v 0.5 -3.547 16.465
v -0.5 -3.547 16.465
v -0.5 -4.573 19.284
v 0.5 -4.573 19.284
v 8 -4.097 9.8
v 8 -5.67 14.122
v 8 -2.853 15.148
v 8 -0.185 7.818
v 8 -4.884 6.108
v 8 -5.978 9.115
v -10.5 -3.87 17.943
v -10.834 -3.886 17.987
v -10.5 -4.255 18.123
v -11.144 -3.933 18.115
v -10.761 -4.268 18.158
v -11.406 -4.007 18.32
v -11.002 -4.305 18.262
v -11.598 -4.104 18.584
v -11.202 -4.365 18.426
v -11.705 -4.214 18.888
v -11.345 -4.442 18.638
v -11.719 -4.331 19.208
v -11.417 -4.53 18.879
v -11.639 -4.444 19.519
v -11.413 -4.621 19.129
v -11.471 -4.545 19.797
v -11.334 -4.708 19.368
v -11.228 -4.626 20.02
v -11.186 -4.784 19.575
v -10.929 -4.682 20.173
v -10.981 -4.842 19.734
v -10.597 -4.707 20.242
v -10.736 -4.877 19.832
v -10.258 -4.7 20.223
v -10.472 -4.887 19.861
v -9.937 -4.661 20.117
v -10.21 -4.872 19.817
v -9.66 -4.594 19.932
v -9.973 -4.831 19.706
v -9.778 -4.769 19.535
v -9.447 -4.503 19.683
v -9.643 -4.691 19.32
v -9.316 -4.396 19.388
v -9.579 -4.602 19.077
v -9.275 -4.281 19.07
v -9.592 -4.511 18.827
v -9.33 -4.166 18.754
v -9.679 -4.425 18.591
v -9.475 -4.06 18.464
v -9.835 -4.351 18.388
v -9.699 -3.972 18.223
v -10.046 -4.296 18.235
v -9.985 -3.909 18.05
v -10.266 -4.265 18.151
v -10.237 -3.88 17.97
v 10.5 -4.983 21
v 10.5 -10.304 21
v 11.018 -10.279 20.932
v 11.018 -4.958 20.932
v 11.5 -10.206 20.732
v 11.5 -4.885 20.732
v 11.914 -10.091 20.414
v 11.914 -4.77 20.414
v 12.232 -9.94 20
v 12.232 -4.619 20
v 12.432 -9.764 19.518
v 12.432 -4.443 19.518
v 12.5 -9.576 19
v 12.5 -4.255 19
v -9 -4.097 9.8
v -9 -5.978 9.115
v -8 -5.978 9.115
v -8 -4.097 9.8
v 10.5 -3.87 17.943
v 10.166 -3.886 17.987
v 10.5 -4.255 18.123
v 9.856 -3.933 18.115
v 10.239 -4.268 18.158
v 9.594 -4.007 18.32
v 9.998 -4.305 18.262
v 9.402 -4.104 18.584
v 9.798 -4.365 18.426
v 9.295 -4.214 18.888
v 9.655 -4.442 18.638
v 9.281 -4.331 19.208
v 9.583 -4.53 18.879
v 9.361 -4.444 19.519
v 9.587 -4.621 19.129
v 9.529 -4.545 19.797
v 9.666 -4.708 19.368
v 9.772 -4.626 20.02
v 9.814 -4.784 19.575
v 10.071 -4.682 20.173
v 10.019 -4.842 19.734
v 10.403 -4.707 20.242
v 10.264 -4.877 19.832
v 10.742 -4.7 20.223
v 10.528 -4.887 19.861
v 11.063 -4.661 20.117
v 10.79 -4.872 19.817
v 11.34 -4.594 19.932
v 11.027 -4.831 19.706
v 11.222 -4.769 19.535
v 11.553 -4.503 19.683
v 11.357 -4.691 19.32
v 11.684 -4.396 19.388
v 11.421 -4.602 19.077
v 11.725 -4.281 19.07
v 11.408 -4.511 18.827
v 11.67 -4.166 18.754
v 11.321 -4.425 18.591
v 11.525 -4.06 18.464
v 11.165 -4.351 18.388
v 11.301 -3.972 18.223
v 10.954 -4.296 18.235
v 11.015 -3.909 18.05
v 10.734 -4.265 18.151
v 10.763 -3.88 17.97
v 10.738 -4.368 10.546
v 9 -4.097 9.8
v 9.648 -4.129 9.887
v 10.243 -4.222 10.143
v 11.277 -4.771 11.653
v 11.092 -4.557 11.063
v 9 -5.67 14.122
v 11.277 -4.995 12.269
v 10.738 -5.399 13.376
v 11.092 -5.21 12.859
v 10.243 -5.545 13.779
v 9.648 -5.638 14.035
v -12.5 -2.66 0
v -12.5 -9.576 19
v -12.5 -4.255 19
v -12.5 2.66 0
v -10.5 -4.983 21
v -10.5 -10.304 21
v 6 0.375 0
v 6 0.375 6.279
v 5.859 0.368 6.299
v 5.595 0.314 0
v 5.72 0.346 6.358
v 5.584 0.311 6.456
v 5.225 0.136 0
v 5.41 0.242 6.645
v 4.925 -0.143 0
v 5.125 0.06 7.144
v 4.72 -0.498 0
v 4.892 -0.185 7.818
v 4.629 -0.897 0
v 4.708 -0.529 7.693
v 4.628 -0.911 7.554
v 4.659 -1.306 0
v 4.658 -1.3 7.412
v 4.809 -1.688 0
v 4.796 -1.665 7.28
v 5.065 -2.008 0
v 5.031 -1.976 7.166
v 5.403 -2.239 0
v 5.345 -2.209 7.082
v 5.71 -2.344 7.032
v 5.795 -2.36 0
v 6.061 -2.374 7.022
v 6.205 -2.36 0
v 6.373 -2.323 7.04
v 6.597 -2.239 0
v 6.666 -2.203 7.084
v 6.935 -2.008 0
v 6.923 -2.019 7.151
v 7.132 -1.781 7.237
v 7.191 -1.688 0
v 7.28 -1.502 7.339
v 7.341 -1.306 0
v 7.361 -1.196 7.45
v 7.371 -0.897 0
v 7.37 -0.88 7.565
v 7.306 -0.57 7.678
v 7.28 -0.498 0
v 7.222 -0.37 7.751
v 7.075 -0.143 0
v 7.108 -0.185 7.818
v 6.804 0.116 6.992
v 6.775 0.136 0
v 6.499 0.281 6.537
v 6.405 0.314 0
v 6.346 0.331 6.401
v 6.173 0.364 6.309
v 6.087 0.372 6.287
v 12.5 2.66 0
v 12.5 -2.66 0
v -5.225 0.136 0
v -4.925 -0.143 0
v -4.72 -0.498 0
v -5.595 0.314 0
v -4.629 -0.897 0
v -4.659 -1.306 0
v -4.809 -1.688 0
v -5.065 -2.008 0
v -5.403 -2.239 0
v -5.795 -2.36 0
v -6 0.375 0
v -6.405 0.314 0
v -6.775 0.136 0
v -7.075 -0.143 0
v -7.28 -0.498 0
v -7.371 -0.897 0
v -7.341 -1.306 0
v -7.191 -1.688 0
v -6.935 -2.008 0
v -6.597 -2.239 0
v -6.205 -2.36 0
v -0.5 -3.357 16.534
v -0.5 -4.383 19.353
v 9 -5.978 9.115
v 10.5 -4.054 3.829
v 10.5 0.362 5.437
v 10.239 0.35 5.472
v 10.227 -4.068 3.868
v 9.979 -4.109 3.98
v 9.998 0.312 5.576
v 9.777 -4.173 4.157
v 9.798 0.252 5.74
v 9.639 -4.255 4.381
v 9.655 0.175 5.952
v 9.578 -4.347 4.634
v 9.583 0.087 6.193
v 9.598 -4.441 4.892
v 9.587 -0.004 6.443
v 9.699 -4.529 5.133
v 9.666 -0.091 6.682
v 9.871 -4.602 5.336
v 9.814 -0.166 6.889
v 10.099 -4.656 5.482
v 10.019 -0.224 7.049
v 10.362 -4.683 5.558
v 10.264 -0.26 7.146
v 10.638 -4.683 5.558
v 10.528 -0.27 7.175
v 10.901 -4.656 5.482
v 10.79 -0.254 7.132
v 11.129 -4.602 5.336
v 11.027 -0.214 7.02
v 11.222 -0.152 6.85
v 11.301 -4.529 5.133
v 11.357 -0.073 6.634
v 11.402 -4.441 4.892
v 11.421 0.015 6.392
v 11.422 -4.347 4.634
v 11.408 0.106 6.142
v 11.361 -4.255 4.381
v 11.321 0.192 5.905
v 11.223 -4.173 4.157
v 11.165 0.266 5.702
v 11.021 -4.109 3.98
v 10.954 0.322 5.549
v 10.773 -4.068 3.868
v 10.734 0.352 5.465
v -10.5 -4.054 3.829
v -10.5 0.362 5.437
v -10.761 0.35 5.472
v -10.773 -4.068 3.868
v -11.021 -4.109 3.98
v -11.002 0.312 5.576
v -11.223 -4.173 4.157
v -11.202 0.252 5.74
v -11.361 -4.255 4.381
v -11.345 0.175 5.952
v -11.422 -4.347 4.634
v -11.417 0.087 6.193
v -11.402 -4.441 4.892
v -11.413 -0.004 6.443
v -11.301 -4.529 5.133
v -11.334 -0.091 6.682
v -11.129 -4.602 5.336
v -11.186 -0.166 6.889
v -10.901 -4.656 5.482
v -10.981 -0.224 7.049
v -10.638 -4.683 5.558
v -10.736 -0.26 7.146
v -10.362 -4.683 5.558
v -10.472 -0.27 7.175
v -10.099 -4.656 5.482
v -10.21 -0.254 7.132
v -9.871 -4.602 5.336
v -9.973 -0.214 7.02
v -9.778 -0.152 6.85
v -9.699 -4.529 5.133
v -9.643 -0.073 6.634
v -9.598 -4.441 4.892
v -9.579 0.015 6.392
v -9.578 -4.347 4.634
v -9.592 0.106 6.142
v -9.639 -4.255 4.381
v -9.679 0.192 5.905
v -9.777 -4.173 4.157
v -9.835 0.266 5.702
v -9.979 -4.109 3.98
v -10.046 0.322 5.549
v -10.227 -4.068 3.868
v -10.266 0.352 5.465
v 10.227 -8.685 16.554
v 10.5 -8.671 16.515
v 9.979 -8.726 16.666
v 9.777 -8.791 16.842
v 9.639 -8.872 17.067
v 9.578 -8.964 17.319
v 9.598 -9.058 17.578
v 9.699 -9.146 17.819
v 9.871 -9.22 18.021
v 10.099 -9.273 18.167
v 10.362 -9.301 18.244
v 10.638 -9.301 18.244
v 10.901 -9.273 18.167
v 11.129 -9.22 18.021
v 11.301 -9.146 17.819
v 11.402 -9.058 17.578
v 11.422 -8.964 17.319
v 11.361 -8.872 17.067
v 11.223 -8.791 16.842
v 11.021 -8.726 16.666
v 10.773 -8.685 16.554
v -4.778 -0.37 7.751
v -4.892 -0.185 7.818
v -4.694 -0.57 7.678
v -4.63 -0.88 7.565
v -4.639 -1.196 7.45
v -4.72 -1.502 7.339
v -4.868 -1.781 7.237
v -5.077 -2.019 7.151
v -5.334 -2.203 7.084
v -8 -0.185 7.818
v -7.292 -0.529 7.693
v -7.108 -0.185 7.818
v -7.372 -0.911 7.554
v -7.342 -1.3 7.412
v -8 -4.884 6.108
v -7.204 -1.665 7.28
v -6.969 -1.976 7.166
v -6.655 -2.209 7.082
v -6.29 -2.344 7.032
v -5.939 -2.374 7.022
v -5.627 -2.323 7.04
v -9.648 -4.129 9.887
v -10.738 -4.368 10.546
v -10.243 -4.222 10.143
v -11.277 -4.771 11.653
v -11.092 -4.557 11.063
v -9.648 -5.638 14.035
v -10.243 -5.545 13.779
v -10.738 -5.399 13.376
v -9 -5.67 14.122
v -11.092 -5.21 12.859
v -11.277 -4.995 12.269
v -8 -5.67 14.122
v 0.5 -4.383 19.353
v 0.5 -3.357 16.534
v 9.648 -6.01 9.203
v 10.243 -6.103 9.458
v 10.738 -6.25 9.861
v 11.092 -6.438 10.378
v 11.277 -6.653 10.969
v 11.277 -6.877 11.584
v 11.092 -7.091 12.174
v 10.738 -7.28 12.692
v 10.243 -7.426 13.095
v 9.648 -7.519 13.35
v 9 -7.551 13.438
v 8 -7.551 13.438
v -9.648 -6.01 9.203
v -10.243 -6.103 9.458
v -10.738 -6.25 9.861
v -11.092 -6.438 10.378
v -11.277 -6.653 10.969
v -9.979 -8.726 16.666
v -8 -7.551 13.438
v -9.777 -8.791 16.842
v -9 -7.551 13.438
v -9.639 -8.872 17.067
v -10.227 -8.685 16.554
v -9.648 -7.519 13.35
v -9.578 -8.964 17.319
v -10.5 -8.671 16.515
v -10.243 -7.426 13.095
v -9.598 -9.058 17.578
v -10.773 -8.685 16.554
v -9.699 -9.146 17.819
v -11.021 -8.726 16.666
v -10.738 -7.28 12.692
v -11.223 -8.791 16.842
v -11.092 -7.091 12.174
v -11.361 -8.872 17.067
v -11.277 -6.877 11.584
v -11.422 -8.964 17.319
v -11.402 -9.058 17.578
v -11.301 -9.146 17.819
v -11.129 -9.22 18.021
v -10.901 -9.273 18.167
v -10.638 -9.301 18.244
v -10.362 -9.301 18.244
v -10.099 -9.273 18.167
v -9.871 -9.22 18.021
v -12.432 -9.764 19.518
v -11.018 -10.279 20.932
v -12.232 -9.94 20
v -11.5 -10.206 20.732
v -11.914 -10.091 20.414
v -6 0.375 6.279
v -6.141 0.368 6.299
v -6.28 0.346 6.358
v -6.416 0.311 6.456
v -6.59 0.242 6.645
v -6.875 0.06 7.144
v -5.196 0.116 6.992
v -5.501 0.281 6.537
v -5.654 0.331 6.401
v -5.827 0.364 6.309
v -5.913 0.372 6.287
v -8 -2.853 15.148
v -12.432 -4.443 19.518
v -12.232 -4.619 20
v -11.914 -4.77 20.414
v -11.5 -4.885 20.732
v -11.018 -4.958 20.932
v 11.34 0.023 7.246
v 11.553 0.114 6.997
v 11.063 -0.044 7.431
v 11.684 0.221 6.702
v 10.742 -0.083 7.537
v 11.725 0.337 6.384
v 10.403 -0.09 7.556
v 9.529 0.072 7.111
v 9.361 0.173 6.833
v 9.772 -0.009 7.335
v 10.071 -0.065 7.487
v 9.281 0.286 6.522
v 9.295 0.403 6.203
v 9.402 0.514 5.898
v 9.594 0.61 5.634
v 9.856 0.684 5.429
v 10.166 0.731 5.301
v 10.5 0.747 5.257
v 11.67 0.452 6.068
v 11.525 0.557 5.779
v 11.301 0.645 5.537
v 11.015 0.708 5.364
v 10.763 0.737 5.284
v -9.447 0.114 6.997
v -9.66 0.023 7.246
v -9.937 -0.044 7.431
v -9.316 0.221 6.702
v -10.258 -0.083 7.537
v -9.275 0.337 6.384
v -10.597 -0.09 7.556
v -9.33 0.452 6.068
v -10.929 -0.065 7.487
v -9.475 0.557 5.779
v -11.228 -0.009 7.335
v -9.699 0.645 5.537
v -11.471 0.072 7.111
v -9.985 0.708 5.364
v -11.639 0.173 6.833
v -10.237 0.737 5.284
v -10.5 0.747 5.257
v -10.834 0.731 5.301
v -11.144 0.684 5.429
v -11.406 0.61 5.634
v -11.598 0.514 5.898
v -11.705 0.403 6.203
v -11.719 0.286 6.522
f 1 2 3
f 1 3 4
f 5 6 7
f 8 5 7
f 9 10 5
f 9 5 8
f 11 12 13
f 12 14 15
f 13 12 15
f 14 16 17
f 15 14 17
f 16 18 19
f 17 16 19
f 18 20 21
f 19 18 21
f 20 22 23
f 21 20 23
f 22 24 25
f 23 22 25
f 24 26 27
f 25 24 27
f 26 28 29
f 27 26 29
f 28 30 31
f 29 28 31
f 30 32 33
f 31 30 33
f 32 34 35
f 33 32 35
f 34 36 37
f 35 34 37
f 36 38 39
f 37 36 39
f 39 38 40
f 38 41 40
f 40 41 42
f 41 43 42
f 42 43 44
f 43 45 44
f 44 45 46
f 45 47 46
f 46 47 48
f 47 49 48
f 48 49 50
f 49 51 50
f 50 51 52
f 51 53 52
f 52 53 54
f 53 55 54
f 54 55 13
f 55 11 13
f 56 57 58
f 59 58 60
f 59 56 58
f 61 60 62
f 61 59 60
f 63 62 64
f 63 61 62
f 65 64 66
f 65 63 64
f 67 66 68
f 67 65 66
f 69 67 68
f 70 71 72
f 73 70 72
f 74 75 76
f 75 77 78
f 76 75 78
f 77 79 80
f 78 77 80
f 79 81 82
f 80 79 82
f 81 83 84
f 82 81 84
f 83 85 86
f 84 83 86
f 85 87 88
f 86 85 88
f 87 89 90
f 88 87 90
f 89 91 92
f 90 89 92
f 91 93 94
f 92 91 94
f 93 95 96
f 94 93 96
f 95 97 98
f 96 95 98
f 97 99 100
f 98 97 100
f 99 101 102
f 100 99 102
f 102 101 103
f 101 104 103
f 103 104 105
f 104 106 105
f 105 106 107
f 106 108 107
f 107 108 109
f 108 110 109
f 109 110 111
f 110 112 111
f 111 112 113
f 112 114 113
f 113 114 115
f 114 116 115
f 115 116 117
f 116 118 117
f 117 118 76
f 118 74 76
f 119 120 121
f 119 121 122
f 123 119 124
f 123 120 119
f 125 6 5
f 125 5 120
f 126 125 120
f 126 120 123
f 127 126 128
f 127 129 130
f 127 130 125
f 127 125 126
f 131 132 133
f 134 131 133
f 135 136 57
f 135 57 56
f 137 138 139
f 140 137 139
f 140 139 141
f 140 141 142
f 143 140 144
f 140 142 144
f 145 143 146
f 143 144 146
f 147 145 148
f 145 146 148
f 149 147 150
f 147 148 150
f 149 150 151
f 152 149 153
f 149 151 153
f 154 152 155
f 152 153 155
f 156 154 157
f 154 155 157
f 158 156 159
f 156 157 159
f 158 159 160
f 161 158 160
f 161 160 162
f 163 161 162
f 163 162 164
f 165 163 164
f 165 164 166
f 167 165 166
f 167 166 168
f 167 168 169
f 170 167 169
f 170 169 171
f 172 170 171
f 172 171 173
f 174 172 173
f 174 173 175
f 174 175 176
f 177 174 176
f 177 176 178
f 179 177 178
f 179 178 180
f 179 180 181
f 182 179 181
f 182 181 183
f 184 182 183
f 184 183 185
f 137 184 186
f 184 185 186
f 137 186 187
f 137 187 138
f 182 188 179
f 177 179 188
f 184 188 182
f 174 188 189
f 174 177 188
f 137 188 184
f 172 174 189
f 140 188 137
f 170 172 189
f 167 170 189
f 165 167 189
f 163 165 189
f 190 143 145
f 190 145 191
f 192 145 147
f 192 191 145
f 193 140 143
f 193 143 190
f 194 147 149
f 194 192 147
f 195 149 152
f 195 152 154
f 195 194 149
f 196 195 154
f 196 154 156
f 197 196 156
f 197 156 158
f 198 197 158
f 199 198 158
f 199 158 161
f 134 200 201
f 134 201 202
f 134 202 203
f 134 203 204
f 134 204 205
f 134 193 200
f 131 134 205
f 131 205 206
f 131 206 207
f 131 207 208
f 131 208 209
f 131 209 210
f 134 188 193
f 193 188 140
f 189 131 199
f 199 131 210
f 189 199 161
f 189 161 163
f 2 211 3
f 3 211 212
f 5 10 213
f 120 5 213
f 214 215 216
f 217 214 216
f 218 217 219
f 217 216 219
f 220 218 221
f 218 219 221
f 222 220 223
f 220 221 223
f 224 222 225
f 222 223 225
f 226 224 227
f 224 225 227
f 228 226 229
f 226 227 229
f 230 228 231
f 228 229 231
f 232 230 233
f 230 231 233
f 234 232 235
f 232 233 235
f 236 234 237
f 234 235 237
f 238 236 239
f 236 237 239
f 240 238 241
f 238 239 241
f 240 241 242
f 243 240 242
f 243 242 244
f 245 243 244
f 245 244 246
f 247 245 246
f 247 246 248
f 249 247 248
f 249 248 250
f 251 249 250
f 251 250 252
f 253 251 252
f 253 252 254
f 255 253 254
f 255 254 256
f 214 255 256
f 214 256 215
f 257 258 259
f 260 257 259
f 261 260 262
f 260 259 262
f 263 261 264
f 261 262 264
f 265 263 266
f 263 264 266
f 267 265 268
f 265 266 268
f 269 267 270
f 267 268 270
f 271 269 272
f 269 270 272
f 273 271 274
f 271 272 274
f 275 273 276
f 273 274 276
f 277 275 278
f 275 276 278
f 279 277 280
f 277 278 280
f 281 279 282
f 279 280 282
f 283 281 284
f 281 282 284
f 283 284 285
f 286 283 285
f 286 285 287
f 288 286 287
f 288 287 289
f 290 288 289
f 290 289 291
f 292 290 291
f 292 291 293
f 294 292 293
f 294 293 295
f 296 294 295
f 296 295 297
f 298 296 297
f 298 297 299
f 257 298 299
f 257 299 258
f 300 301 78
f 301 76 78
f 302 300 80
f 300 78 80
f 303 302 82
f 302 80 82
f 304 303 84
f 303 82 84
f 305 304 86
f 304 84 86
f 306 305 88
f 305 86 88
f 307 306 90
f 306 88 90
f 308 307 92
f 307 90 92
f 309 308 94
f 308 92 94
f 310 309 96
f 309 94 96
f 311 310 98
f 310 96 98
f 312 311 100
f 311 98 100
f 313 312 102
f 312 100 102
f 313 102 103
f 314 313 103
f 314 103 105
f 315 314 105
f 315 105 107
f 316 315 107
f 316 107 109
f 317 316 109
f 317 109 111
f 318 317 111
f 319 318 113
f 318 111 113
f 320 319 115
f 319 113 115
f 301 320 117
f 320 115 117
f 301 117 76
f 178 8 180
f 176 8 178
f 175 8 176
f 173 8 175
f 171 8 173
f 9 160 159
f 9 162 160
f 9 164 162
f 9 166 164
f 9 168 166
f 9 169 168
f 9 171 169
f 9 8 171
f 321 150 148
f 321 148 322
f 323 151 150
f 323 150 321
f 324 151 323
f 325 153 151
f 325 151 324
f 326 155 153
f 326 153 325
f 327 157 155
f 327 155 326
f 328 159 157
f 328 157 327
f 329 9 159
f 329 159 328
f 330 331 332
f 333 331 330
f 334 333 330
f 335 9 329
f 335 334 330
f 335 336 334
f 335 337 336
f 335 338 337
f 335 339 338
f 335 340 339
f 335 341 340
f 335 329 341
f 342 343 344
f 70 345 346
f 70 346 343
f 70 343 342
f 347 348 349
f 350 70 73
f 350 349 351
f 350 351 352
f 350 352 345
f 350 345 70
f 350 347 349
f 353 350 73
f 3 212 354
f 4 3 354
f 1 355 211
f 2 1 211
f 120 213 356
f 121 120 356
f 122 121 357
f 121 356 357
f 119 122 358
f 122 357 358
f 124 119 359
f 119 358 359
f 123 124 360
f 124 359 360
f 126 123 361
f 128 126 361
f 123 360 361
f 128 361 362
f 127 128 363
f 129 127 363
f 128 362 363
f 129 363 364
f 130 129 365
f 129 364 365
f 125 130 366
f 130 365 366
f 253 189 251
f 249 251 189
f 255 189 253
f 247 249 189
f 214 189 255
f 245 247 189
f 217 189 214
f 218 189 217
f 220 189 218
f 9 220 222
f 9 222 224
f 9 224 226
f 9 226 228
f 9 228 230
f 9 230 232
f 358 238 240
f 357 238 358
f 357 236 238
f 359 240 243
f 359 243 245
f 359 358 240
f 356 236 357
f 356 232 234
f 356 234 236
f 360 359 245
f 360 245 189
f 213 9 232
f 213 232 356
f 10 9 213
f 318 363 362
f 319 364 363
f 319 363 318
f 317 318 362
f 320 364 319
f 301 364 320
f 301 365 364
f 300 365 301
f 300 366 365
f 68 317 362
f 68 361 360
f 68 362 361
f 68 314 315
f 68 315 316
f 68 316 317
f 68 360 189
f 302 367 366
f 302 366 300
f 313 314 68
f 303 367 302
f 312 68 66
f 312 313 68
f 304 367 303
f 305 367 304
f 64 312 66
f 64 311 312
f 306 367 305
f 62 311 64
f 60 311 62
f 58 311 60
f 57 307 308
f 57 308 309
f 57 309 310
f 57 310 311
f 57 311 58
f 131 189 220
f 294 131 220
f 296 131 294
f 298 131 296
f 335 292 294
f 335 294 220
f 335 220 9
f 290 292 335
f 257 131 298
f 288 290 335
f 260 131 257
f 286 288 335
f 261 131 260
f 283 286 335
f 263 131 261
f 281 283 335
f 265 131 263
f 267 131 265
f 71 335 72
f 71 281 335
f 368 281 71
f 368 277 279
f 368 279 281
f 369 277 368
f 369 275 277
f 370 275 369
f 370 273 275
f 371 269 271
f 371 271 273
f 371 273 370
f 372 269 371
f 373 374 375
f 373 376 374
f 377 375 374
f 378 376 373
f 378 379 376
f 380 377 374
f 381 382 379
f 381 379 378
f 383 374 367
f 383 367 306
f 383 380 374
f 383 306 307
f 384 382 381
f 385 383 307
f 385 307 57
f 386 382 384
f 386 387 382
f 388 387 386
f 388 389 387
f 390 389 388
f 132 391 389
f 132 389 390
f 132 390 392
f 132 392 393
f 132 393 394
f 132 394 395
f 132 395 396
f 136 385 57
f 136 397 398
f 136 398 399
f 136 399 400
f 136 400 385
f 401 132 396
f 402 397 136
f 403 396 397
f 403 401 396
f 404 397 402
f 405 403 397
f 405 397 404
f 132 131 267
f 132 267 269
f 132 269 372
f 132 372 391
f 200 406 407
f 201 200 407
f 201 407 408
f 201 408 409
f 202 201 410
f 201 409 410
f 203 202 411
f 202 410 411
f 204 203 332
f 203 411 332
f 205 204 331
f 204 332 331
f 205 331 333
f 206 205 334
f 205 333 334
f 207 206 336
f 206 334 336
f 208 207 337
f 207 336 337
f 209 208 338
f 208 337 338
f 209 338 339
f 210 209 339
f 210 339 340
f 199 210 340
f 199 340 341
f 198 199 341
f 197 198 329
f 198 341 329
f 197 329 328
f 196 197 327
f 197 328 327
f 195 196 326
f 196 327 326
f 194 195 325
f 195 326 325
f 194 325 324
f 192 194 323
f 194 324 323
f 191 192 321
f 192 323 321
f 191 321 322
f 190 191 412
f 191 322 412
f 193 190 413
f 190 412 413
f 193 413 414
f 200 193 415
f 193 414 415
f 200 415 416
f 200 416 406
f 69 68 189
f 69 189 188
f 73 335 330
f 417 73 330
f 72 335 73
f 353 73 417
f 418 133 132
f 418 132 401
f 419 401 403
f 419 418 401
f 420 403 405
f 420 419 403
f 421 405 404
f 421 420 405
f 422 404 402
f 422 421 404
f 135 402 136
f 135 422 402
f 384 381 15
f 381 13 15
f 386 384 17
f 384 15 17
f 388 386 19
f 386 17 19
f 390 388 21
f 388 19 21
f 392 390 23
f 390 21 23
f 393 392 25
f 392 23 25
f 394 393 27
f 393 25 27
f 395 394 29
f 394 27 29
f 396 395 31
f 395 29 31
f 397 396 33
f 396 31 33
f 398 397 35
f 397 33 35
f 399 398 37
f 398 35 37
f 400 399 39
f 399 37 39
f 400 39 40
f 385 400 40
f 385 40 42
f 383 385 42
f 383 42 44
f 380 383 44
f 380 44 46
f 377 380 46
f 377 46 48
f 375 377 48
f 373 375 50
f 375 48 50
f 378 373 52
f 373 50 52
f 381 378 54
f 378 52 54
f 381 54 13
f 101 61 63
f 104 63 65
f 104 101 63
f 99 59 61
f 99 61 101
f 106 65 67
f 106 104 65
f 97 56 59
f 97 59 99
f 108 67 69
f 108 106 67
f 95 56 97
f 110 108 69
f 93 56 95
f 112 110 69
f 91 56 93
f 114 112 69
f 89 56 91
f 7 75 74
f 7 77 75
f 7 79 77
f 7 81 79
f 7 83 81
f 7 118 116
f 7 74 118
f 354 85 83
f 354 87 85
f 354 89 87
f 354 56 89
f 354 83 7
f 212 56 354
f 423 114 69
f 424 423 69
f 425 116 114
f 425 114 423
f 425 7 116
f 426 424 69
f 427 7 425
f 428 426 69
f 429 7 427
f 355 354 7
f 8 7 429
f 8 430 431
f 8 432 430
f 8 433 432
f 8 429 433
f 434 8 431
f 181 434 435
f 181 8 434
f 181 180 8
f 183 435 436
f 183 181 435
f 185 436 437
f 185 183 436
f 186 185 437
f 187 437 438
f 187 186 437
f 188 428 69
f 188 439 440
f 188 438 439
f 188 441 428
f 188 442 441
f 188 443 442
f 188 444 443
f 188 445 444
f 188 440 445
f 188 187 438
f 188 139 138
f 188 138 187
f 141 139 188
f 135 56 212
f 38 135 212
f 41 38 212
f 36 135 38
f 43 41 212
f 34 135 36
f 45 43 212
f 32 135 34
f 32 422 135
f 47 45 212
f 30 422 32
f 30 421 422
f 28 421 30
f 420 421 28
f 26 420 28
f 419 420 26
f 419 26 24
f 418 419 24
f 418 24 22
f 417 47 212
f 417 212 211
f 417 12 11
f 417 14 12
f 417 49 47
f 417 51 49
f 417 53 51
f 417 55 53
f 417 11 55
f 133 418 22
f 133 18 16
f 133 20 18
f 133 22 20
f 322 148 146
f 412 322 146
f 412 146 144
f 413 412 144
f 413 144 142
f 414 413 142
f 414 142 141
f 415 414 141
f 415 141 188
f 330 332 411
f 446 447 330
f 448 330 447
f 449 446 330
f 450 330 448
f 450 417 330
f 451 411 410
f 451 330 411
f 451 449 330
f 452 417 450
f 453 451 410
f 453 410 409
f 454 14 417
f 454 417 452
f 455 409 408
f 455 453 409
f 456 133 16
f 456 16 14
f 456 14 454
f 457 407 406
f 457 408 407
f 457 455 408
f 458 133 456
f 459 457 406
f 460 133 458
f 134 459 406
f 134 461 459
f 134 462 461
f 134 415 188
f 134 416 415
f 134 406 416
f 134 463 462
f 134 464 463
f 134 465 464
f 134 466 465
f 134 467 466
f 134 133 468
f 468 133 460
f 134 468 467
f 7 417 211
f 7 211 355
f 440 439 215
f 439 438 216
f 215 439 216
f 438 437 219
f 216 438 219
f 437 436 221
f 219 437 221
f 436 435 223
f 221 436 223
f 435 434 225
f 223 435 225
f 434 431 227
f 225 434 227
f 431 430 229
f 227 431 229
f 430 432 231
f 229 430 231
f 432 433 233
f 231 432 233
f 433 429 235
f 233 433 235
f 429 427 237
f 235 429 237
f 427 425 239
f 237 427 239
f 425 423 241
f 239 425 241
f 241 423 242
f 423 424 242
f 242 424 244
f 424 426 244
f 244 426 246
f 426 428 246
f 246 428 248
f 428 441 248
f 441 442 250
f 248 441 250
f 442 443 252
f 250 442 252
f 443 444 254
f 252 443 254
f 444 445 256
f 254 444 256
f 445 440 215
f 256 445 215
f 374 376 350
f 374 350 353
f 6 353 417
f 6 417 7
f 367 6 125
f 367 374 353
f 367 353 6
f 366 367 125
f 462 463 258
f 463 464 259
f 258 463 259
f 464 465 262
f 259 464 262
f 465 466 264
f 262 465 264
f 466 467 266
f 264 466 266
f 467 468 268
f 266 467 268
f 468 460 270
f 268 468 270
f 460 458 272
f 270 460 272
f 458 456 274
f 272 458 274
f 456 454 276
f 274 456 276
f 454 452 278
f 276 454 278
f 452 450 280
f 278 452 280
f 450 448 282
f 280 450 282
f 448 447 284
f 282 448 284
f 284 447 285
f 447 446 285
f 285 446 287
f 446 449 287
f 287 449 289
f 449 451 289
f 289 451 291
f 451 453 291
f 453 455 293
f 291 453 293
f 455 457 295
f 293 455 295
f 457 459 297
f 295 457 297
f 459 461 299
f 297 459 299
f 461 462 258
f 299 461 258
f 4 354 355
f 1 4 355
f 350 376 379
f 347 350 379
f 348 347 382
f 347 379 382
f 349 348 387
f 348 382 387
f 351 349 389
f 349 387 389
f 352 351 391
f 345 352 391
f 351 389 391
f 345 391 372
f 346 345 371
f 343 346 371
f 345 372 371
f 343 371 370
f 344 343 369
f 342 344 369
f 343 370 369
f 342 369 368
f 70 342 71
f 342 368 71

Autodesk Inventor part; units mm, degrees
ref_plane "YZ Plane" through (0, 0, 0) normal (1, 0, 0) x (0, 1, 0)
ref_plane "XZ Plane" through (0, 0, 0) normal (0, 1, 0) x (-1, 0, 0)
ref_plane "XY Plane" through (0, 0, 0) normal (0, 0, 1) x (1, 0, 0)
sketch "Skizze1" plane through (0, 0, 0) normal (1, 0, 0) x (0, 1, 0)
  line L0 (2.6604, 0) -> (-2.6604, 0)
  line L1 (-2.6604, 0) -> (-10.3038, 21)
  line L2 (-10.3038, 21) -> (-4.9829, 21)
  line L3 (-4.9829, 21) -> (2.6604, 0)
  point P0 (0, 0)
  point P1 (0, 0)
  dimension "d1" = 21
  dimension "d2" = 70
  dimension "d33" = 5
extrude "Extrusion1" add sketch "Skizze1" along normal mid plane 25
sketch "Skizze3" plane through (-12.5, -2.6604, 0) normal (0, -0.9396926, -0.3420201) x (1, 0, 0)
  line L0 (25, 0) -> (0, 0) projected
  line L1 (25, 22.3477) -> (25, 0) projected
  line L2 (25, 22.3477) -> (0, 22.3477) projected
  line L3 (0, 0) -> (0, 22.3477) projected
  line L4 (3.5, 12) -> (21.5, 12) construction
  line L5 (3.5, 9.7) -> (21.5, 9.7)
  line L6 (21.5, 14.3) -> (3.5, 14.3)
  arc A0 (3.5, 14.3) -> (3.5, 9.7) centre (3.5, 12) ccw
  arc A1 (21.5, 9.7) -> (21.5, 14.3) centre (21.5, 12) ccw
  line L7 (12.5, 22.3477) -> (12.5, 0) construction
  point P0 (12.5, -0.9099)
  point P1 (12.5, 12)
  dimension "d10" = 4.6
  dimension "d11" = 18
  dimension "d12" = 12
extrude "Extrusion3" cut sketch "Skizze3" against normal blind 2 contours A0 L6 A1 L5
sketch "Skizze4" plane through (-12.5, -2.6604, 0) normal (0, -0.9396926, -0.3420201) x (1, 0, 0)
  line L0 (2, 18.5) -> (23, 18.5) construction
  line L1 (23, 18.5) -> (23, 5) construction
  line L2 (23, 5) -> (2, 5) construction
  line L3 (2, 5) -> (2, 18.5) construction
  line L4 (3.5, 14.3) -> (21.5, 14.3) projected
  arc A0 (21.5, 9.7) -> (21.5, 14.3) centre (21.5, 12) ccw projected
  line L5 (21.5, 9.7) -> (3.5, 9.7) projected
  arc A1 (3.5, 14.3) -> (3.5, 9.7) centre (3.5, 12) ccw projected
  line L6 (25, 0) -> (0, 0) projected
  line L7 (25, 22.3477) -> (25, 0) projected
  line L8 (25, 22.3477) -> (0, 22.3477) projected
  line L9 (0, 0) -> (0, 22.3477) projected
  line L10 (25, 22.3477) -> (0, 22.3477) construction
  line L11 (12.5, 22.3477) -> (12.5, 0) construction
  line L12 (25, 0) -> (0, 0) construction
  point P0 (12.5, -0.9099)
  dimension "d15" = 21
  dimension "d16" = 13.5
  dimension "d34" = 7
hole "Bohrung1" at (-10.5, -8.9878, 17.3843) at (10.5, -8.9878, 17.3843) at (10.5, -4.3705, 4.6985) at (-10.5, -4.3705, 4.6985) direction (0, 0.9396926, 0.3420201) diameter 1.85 end through all
sketch "Skizze5" plane through (12.5, 2.6604, 0) normal (0, 0, -1) x (-1, 0, 0)
  line L0 (25, 0) -> (0, 0) projected
  line L1 (0, -5.3209) -> (0, 0) projected
  line L2 (0, -5.3209) -> (25, -5.3209) projected
  line L3 (25, 0) -> (25, -5.3209) projected
  line L4 (0, -5.3209) -> (0, 0) construction
  line L5 (25, 0) -> (25, -5.3209) construction
  line L6 (0, -3.6604) -> (25, -3.6604) construction
  line L7 (25, 0) -> (0, 0) construction
  line L8 (12.5, 0) -> (12.5, -5.3209) construction
  point P0 (12.5, -2.6604)
  point P1 (6.5, -3.6604)
  point P2 (18.5, -3.6604)
  dimension "d25" = 12
  dimension "d43" = 1
hole "Bohrung2" at (6, -1, 0) at (-6, -1, 0) direction (0, 0, 1) diameter 2.75 end through all
sketch "Skizze6" plane through (-12.5, -2.6604, 0) normal (0, -0.9396926, -0.3420201) x (1, 0, 0)
  line L0 (21.5, 9.7) -> (3.5, 9.7) projected
  arc A0 (21.5, 9.7) -> (21.5, 14.3) centre (21.5, 12) ccw projected
  line L1 (3.5, 14.3) -> (21.5, 14.3) projected
  arc A1 (3.5, 14.3) -> (3.5, 9.7) centre (3.5, 12) ccw projected
  line L2 (3.5, 14.3) -> (21.5, 14.3) projected
  line L3 (4.5, 14.3) -> (20.5, 14.3)
  line L4 (20.5, 14.3) -> (20.5, 6.5)
  line L5 (20.5, 6.5) -> (4.5, 6.5)
  line L6 (4.5, 6.5) -> (4.5, 14.3)
  line L7 (21.5, 9.7) -> (3.5, 9.7) construction
  line L8 (12.5, 9.7) -> (12.5, 14.3) construction
  point P0 (12.5, -0.9099)
  dimension "d35" = 16
  dimension "d36" = 7.8
extrude "Extrusion4" cut sketch "Skizze6" against normal through all contours L4 L5 L6 L0 | L0 L6 L1 L4
fillet "Rundung1" radius 2 2 edges at (-12.5, -7.6434, 21) (12.5, -7.6434, 21)
chamfer "Fase1" distance 0.3 angle 45 4 edges at (10.5, 0.0115, 7.2778) (10.5, -4.6057, 19.9636) (-10.5, -4.6057, 19.9636) (-10.5, 0.0115, 7.2778)
sketch "Skizze7" plane through (-12.5, 2.6604, 0) normal (0, 0.9396926, 0.3420201) x (1, 0, 0)
  circle A0 centre (2, -20.3199) radius 1.225 projected
  circle A1 centre (23, -6.8199) radius 1.225 projected
  ellipse E0 centre (23, -20.2194) end of major axis (23, -22.3477) minor radius 2 (23, -22.3477) -> (25, -20.2194) ccw projected
  line L0 (25, 0) -> (25, -20.2194) projected
  line L1 (0, 0) -> (25, 0) projected
  line L2 (0, -20.2194) -> (0, 0) projected
  ellipse E1 centre (2, -20.2194) end of major axis (2, -22.3477) minor radius 2 (0, -20.2194) -> (2, -22.3477) ccw projected
  line L3 (23, -22.3477) -> (2, -22.3477) projected
  line L4 (19.6075, -8.3199) -> (20.5, -8.3199) projected
  line L5 (20.5, -8.3199) -> (20.5, -16.1199) projected
  line L6 (20.5, -16.1199) -> (4.5, -16.1199) projected
  line L7 (4.5, -16.1199) -> (4.5, -8.3199) projected
  line L8 (4.5, -8.3199) -> (5.3925, -8.3199) projected
  ellipse E2 centre (6.5, -10.7024) end of major axis (6.5, -6.6822) minor radius 1.375 (7.6075, -8.3199) -> (5.3925, -8.3199) ccw projected
  line L9 (7.6075, -8.3199) -> (17.3925, -8.3199) projected
  ellipse E3 centre (18.5, -10.7024) end of major axis (18.5, -6.6822) minor radius 1.375 (19.6075, -8.3199) -> (17.3925, -8.3199) ccw projected
  circle A2 centre (23, -20.3199) radius 1.225 projected
  circle A3 centre (2, -6.8199) radius 1.225 projected
  line L10 (13, -17.5949) -> (12, -17.5949)
  line L11 (12, -17.5949) -> (12, -20.5949)
  line L12 (12, -20.5949) -> (13, -20.5949)
  line L13 (13, -20.5949) -> (13, -17.5949)
  line L14 (13, -17.5949) -> (12, -20.5949) construction
  line L15 (12, -17.5949) -> (13, -20.5949) construction
  point P0 (12.5, -0.9099)
  point P1 (12.5, -19.0949)
  dimension "d44" = 1
  dimension "d45" = 3
extrude "Extrusion5" cut sketch "Skizze7" against normal blind 0.2 contours L13 L12 L11 L10
properties part number "Kamerahalter Vorne geneigt"
